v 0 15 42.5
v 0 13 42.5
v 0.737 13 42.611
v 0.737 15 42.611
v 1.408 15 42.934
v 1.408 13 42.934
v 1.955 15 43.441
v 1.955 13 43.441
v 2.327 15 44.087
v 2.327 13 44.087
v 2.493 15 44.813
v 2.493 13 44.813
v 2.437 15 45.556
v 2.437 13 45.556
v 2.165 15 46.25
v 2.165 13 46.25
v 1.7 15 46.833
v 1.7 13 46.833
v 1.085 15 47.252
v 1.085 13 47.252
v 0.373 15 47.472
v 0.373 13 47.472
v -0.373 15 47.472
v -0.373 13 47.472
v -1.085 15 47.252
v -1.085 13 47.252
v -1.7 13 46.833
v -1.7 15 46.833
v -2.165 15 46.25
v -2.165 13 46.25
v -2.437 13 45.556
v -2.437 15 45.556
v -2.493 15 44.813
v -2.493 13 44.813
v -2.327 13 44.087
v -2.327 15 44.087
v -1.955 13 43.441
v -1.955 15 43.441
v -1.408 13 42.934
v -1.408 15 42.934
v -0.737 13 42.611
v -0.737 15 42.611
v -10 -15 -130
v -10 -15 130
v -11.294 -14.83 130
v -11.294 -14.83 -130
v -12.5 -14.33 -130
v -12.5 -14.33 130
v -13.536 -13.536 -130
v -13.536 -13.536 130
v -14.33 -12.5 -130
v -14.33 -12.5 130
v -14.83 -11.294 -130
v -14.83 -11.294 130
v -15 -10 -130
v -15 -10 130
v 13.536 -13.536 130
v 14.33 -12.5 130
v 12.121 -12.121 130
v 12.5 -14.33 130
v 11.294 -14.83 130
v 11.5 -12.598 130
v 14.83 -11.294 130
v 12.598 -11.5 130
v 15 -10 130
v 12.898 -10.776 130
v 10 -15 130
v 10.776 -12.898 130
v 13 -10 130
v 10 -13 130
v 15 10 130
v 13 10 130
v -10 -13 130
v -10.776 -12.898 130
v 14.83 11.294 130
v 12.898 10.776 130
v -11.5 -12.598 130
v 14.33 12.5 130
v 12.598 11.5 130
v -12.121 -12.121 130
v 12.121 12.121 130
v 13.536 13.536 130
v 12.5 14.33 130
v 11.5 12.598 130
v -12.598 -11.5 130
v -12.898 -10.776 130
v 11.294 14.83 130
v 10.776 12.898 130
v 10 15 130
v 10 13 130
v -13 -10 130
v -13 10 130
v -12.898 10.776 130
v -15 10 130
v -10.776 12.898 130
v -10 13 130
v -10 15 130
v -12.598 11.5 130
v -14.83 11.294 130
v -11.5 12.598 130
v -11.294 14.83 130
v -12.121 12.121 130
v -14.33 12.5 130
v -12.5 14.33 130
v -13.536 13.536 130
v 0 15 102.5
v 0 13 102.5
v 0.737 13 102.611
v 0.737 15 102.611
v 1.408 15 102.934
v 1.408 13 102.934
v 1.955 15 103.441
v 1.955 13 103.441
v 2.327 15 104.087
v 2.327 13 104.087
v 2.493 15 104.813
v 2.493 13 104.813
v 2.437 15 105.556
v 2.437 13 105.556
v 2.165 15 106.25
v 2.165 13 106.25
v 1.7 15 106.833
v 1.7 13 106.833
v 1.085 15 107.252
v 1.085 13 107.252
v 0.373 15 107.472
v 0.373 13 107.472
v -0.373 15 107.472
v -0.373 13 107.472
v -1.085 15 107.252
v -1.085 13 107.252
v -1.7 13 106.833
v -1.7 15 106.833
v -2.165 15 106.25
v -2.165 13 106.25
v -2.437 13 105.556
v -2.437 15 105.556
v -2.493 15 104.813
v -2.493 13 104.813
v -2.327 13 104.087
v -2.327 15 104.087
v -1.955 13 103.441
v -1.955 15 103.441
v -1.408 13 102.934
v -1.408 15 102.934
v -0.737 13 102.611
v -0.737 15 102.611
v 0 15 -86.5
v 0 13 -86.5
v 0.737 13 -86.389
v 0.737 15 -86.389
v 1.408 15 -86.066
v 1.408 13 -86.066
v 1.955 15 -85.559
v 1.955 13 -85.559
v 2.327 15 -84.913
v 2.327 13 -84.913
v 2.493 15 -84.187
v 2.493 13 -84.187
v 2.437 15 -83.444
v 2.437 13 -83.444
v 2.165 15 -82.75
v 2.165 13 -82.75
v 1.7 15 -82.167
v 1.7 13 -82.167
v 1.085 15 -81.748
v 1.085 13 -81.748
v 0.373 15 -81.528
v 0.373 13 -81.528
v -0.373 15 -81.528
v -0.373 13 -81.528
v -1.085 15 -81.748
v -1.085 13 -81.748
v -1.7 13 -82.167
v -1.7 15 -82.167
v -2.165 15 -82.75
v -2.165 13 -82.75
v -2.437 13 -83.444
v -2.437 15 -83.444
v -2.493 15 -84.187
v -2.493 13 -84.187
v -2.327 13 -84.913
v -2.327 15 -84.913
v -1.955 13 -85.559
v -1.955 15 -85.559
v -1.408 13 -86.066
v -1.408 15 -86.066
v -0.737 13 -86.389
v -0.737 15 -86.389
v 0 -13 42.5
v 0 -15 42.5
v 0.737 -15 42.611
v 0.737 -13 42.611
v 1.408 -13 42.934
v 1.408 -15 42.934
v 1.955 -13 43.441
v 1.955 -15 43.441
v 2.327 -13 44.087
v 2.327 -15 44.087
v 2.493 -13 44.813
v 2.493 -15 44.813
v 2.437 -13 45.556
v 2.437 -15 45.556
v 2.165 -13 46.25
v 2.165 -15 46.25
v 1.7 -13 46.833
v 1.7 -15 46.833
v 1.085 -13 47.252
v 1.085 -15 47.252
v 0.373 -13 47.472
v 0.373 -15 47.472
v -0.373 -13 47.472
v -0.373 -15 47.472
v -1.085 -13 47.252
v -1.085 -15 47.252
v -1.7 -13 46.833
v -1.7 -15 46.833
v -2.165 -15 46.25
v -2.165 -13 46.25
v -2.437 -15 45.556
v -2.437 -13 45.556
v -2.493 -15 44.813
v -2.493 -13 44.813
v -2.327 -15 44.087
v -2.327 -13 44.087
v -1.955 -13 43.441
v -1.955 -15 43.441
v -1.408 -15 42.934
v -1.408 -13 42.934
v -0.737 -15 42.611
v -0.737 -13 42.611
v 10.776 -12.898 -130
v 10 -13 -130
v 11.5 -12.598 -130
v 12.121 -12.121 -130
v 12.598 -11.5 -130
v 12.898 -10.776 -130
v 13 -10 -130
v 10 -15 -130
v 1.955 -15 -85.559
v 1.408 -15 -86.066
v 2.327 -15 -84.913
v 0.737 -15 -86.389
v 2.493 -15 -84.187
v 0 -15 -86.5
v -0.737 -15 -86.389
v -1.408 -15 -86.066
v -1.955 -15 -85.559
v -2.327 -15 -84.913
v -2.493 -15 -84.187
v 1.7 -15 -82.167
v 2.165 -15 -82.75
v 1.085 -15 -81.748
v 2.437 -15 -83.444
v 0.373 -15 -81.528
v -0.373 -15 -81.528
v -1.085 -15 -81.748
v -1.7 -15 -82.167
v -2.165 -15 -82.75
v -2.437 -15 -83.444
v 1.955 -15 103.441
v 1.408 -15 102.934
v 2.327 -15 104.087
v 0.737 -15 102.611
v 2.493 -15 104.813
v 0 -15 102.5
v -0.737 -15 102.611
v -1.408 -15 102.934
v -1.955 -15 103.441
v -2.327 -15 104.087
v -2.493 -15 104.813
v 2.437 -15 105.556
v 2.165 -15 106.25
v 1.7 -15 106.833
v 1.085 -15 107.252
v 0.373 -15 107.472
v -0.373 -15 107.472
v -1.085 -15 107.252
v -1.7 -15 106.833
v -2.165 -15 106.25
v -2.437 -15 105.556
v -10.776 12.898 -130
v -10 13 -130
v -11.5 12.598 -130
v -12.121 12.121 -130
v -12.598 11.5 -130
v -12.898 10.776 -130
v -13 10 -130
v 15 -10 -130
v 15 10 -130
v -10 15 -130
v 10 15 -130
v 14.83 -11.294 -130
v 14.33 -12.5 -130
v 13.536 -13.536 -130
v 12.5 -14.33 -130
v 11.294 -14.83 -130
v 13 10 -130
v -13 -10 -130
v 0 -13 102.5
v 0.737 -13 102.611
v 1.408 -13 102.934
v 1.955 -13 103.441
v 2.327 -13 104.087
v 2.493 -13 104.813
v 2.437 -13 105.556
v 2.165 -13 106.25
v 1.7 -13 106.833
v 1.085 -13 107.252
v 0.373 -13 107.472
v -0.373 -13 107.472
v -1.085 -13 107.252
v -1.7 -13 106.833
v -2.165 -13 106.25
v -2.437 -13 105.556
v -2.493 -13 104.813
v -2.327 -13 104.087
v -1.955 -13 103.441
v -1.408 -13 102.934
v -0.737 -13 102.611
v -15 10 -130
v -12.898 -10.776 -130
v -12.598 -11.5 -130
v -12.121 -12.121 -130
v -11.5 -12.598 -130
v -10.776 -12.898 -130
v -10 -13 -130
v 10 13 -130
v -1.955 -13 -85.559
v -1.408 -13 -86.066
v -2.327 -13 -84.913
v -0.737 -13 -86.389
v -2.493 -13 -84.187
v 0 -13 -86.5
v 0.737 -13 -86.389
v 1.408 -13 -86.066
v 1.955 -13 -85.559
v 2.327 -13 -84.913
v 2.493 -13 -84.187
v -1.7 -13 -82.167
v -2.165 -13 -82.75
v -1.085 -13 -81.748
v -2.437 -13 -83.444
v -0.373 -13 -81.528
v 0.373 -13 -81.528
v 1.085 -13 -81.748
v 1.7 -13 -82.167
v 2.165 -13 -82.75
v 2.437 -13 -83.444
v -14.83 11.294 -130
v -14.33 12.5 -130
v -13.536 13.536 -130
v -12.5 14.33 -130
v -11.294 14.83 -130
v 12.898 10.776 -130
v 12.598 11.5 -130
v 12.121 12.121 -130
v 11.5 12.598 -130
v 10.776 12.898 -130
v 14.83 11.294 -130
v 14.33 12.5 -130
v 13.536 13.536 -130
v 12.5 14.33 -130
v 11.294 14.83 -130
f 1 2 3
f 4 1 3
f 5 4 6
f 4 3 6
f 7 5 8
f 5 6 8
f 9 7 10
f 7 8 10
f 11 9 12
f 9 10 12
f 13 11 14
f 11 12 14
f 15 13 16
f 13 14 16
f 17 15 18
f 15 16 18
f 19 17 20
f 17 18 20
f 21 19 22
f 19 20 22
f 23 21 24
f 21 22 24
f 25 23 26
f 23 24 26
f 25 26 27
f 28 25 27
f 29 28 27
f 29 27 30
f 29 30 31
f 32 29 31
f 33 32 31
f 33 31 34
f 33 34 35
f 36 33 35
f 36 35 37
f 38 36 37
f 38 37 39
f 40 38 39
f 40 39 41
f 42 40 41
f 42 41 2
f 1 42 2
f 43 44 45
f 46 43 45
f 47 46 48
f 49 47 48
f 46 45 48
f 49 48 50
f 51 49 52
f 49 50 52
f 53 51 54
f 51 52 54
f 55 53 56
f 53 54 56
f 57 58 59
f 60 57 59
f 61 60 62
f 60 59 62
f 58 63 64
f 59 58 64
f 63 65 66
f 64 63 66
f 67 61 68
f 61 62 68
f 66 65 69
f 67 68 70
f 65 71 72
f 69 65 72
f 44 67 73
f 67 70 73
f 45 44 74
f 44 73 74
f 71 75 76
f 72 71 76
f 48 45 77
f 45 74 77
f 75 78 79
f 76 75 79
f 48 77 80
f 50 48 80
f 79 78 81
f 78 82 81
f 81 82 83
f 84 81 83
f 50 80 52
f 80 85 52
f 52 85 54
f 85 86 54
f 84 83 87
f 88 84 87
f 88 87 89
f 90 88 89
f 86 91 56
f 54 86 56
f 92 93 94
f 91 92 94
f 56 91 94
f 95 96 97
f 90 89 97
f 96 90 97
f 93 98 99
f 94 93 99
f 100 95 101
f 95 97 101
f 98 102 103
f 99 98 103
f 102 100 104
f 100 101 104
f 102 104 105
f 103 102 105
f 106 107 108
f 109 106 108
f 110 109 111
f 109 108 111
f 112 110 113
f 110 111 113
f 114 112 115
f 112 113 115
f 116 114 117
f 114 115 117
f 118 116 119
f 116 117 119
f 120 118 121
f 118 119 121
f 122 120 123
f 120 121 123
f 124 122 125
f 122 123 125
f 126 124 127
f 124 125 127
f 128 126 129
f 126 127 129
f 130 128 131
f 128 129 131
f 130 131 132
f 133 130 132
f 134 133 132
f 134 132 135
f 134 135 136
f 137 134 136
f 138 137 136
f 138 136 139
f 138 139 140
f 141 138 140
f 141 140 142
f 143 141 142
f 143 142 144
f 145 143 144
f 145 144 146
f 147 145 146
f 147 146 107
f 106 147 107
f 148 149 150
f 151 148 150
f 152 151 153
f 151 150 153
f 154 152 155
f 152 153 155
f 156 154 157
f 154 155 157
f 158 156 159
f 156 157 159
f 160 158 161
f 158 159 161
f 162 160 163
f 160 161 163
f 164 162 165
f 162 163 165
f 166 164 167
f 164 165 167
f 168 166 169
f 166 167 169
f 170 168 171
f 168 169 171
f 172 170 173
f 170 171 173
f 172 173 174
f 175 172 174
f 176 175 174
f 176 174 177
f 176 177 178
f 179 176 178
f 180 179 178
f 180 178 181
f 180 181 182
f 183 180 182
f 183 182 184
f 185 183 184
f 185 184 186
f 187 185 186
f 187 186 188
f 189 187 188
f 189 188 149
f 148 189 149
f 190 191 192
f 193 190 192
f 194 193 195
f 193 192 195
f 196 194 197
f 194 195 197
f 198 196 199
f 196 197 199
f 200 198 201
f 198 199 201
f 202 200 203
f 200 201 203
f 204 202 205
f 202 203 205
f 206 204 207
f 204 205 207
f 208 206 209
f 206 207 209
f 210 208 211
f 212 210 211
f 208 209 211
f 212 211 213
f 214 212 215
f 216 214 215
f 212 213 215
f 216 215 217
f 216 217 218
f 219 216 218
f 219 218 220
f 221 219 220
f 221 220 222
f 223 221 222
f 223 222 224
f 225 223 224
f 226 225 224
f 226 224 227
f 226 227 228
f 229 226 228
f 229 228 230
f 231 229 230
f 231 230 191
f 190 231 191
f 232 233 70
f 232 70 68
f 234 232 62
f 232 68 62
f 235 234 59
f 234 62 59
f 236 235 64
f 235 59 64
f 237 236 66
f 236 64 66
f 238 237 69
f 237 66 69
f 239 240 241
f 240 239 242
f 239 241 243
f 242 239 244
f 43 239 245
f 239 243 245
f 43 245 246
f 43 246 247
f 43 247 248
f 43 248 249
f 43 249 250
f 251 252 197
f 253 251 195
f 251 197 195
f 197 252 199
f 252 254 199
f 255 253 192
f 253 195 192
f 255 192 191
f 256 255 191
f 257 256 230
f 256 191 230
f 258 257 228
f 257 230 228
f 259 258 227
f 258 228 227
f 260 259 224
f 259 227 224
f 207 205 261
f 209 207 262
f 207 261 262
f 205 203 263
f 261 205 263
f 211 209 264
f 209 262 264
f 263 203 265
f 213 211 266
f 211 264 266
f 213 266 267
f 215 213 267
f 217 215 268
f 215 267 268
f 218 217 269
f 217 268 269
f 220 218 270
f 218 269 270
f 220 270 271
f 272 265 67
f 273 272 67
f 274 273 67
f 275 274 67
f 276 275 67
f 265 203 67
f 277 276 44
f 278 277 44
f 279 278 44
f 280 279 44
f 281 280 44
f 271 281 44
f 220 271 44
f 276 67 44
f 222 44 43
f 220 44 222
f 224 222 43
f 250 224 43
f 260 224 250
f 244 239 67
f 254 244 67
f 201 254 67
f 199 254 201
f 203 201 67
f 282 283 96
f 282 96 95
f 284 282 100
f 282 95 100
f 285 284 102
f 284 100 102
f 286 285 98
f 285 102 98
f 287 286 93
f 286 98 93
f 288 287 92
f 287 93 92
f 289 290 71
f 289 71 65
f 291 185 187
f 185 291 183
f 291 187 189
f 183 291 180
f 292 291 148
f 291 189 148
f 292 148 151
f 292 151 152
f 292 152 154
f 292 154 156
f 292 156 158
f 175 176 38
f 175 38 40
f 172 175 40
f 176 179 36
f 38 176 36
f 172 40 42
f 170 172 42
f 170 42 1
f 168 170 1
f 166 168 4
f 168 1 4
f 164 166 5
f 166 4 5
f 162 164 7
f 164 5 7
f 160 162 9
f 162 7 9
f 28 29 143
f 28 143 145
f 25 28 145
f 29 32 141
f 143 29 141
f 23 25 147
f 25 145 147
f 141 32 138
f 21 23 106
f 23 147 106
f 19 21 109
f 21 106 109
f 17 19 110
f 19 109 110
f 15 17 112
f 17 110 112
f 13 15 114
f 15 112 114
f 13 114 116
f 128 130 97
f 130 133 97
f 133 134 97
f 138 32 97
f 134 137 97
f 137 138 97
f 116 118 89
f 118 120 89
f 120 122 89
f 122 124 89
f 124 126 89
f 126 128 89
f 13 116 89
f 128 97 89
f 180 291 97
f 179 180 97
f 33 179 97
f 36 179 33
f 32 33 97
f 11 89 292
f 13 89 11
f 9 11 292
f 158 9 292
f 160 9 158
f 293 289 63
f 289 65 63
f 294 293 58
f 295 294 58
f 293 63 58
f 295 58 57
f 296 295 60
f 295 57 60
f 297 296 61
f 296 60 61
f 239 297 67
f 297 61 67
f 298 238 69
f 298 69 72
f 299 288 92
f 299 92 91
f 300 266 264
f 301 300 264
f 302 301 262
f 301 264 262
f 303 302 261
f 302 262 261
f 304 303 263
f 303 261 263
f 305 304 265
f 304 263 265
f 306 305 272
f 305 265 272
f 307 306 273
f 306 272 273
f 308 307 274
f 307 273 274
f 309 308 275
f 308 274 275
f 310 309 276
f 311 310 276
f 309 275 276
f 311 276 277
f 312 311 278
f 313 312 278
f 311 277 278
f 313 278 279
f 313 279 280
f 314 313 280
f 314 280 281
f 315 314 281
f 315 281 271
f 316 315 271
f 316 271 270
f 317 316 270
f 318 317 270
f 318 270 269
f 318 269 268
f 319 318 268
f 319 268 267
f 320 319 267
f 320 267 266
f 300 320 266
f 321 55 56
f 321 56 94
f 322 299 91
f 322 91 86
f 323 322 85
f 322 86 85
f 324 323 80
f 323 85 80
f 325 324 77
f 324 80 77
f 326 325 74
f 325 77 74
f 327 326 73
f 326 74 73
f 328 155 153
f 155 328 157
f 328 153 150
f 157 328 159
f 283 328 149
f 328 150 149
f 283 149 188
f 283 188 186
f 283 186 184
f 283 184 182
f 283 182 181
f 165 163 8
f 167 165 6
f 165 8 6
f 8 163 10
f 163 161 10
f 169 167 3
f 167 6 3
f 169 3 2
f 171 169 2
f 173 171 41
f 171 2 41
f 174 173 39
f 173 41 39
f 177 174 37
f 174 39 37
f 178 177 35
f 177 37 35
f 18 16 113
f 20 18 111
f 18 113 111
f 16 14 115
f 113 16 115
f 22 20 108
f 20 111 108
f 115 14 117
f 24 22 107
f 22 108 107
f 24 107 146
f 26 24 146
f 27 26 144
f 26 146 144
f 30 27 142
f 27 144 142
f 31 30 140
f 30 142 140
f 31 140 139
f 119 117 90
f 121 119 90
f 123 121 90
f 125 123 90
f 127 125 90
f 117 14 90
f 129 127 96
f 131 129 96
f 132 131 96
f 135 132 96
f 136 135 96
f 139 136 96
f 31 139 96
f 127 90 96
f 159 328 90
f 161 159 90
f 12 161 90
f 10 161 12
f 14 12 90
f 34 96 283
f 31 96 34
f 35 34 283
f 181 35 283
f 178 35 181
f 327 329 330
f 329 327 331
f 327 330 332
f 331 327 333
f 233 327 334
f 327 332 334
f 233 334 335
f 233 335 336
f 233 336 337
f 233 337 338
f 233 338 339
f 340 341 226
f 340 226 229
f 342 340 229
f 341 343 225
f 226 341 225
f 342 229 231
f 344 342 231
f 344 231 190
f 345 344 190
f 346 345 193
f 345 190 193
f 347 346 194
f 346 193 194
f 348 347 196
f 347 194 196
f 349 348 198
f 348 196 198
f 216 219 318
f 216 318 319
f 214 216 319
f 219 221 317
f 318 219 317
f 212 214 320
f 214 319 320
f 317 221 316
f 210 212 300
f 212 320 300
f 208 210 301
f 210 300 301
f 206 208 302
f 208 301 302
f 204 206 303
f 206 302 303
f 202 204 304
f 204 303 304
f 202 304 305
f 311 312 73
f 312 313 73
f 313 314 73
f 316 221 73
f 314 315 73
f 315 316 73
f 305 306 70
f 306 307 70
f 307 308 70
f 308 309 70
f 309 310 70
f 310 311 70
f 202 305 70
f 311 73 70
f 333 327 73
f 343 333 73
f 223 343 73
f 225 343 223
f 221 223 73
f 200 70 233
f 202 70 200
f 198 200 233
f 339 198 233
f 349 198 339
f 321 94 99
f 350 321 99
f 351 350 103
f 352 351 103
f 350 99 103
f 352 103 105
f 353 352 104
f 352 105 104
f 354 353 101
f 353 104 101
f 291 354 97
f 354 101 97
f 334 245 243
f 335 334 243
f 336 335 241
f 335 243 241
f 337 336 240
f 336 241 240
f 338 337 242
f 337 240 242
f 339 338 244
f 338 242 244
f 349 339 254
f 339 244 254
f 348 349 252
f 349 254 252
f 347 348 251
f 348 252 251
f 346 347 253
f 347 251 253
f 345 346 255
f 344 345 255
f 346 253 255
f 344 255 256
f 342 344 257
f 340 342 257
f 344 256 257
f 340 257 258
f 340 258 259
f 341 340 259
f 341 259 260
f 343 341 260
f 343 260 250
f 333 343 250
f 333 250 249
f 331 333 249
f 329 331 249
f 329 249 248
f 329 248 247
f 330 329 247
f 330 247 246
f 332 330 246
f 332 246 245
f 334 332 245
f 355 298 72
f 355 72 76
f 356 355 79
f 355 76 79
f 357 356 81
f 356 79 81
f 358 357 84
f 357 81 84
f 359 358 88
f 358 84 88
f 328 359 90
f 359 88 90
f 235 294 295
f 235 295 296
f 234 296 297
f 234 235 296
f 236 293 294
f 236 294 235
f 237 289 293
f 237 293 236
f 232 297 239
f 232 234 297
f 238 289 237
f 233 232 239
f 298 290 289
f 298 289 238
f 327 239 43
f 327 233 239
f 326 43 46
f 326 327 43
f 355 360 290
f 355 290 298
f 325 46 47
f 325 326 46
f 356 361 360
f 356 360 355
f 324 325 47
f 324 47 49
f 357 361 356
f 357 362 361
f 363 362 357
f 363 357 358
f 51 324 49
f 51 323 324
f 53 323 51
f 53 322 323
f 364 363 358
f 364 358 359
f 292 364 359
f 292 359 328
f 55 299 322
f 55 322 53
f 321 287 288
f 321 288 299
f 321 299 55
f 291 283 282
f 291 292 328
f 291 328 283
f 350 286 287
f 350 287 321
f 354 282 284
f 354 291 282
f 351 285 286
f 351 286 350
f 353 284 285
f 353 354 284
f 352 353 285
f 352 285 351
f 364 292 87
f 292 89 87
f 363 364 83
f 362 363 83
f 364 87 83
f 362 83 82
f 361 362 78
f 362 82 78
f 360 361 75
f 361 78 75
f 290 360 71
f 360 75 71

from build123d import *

# Parameters (mm, degrees)
AUFSATZ_LINEAR_AUSTRAGEN1_DEPTH = 130
SKIZZE2_R                       = 2.5
SCHNITT_LINEAR_AUSTRAGEN1_DEPTH = 60


with BuildPart() as part:
    # Skizze1 → Aufsatz-Linear austragen1 (new, symmetric)
    with BuildSketch(Plane.XY):
        with BuildLine():
            Line((-10, 15), (10, 15))
            ThreePointArc((10, 15), (13.535533906, 13.535533906), (15, 10))
            Line((15, 10), (15, -10))
            ThreePointArc((15, -10), (13.535533906, -13.535533906), (10, -15))
            Line((10, -15), (-10, -15))
            ThreePointArc((-10, -15), (-13.535533906, -13.535533906), (-15, -10))
            Line((-15, -10), (-15, 10))
            ThreePointArc((-15, 10), (-13.535533906, 13.535533906), (-10, 15))
        make_face()
        with BuildLine():
            Line((-13, 10), (-13, -10))
            ThreePointArc((-13, -10), (-12.121320344, -12.121320344), (-10, -13))
            Line((-10, -13), (10, -13))
            ThreePointArc((10, -13), (12.121320344, -12.121320344), (13, -10))
            Line((13, -10), (13, 10))
            ThreePointArc((13, 10), (12.121320344, 12.121320344), (10, 13))
            Line((10, 13), (-10, 13))
            ThreePointArc((-10, 13), (-12.121320344, 12.121320344), (-13, 10))
        make_face(mode=Mode.SUBTRACT)
    extrude(amount=AUFSATZ_LINEAR_AUSTRAGEN1_DEPTH, both=True)

    # Skizze2 → Schnitt-Linear austragen1 (cut)
    with BuildSketch(Plane.XZ.offset(15)):
        with Locations(Location((0, -84, 0), (0, 0, 270))):
            Circle(SKIZZE2_R)
        with Locations(Location((0, 105, 0), (0, 0, 270))):
            Circle(SKIZZE2_R)
        with Locations(Location((0, 45, 0), (0, 0, 270))):
            Circle(SKIZZE2_R)
    extrude(amount=-SCHNITT_LINEAR_AUSTRAGEN1_DEPTH, mode=Mode.SUBTRACT)


solid = part.part
